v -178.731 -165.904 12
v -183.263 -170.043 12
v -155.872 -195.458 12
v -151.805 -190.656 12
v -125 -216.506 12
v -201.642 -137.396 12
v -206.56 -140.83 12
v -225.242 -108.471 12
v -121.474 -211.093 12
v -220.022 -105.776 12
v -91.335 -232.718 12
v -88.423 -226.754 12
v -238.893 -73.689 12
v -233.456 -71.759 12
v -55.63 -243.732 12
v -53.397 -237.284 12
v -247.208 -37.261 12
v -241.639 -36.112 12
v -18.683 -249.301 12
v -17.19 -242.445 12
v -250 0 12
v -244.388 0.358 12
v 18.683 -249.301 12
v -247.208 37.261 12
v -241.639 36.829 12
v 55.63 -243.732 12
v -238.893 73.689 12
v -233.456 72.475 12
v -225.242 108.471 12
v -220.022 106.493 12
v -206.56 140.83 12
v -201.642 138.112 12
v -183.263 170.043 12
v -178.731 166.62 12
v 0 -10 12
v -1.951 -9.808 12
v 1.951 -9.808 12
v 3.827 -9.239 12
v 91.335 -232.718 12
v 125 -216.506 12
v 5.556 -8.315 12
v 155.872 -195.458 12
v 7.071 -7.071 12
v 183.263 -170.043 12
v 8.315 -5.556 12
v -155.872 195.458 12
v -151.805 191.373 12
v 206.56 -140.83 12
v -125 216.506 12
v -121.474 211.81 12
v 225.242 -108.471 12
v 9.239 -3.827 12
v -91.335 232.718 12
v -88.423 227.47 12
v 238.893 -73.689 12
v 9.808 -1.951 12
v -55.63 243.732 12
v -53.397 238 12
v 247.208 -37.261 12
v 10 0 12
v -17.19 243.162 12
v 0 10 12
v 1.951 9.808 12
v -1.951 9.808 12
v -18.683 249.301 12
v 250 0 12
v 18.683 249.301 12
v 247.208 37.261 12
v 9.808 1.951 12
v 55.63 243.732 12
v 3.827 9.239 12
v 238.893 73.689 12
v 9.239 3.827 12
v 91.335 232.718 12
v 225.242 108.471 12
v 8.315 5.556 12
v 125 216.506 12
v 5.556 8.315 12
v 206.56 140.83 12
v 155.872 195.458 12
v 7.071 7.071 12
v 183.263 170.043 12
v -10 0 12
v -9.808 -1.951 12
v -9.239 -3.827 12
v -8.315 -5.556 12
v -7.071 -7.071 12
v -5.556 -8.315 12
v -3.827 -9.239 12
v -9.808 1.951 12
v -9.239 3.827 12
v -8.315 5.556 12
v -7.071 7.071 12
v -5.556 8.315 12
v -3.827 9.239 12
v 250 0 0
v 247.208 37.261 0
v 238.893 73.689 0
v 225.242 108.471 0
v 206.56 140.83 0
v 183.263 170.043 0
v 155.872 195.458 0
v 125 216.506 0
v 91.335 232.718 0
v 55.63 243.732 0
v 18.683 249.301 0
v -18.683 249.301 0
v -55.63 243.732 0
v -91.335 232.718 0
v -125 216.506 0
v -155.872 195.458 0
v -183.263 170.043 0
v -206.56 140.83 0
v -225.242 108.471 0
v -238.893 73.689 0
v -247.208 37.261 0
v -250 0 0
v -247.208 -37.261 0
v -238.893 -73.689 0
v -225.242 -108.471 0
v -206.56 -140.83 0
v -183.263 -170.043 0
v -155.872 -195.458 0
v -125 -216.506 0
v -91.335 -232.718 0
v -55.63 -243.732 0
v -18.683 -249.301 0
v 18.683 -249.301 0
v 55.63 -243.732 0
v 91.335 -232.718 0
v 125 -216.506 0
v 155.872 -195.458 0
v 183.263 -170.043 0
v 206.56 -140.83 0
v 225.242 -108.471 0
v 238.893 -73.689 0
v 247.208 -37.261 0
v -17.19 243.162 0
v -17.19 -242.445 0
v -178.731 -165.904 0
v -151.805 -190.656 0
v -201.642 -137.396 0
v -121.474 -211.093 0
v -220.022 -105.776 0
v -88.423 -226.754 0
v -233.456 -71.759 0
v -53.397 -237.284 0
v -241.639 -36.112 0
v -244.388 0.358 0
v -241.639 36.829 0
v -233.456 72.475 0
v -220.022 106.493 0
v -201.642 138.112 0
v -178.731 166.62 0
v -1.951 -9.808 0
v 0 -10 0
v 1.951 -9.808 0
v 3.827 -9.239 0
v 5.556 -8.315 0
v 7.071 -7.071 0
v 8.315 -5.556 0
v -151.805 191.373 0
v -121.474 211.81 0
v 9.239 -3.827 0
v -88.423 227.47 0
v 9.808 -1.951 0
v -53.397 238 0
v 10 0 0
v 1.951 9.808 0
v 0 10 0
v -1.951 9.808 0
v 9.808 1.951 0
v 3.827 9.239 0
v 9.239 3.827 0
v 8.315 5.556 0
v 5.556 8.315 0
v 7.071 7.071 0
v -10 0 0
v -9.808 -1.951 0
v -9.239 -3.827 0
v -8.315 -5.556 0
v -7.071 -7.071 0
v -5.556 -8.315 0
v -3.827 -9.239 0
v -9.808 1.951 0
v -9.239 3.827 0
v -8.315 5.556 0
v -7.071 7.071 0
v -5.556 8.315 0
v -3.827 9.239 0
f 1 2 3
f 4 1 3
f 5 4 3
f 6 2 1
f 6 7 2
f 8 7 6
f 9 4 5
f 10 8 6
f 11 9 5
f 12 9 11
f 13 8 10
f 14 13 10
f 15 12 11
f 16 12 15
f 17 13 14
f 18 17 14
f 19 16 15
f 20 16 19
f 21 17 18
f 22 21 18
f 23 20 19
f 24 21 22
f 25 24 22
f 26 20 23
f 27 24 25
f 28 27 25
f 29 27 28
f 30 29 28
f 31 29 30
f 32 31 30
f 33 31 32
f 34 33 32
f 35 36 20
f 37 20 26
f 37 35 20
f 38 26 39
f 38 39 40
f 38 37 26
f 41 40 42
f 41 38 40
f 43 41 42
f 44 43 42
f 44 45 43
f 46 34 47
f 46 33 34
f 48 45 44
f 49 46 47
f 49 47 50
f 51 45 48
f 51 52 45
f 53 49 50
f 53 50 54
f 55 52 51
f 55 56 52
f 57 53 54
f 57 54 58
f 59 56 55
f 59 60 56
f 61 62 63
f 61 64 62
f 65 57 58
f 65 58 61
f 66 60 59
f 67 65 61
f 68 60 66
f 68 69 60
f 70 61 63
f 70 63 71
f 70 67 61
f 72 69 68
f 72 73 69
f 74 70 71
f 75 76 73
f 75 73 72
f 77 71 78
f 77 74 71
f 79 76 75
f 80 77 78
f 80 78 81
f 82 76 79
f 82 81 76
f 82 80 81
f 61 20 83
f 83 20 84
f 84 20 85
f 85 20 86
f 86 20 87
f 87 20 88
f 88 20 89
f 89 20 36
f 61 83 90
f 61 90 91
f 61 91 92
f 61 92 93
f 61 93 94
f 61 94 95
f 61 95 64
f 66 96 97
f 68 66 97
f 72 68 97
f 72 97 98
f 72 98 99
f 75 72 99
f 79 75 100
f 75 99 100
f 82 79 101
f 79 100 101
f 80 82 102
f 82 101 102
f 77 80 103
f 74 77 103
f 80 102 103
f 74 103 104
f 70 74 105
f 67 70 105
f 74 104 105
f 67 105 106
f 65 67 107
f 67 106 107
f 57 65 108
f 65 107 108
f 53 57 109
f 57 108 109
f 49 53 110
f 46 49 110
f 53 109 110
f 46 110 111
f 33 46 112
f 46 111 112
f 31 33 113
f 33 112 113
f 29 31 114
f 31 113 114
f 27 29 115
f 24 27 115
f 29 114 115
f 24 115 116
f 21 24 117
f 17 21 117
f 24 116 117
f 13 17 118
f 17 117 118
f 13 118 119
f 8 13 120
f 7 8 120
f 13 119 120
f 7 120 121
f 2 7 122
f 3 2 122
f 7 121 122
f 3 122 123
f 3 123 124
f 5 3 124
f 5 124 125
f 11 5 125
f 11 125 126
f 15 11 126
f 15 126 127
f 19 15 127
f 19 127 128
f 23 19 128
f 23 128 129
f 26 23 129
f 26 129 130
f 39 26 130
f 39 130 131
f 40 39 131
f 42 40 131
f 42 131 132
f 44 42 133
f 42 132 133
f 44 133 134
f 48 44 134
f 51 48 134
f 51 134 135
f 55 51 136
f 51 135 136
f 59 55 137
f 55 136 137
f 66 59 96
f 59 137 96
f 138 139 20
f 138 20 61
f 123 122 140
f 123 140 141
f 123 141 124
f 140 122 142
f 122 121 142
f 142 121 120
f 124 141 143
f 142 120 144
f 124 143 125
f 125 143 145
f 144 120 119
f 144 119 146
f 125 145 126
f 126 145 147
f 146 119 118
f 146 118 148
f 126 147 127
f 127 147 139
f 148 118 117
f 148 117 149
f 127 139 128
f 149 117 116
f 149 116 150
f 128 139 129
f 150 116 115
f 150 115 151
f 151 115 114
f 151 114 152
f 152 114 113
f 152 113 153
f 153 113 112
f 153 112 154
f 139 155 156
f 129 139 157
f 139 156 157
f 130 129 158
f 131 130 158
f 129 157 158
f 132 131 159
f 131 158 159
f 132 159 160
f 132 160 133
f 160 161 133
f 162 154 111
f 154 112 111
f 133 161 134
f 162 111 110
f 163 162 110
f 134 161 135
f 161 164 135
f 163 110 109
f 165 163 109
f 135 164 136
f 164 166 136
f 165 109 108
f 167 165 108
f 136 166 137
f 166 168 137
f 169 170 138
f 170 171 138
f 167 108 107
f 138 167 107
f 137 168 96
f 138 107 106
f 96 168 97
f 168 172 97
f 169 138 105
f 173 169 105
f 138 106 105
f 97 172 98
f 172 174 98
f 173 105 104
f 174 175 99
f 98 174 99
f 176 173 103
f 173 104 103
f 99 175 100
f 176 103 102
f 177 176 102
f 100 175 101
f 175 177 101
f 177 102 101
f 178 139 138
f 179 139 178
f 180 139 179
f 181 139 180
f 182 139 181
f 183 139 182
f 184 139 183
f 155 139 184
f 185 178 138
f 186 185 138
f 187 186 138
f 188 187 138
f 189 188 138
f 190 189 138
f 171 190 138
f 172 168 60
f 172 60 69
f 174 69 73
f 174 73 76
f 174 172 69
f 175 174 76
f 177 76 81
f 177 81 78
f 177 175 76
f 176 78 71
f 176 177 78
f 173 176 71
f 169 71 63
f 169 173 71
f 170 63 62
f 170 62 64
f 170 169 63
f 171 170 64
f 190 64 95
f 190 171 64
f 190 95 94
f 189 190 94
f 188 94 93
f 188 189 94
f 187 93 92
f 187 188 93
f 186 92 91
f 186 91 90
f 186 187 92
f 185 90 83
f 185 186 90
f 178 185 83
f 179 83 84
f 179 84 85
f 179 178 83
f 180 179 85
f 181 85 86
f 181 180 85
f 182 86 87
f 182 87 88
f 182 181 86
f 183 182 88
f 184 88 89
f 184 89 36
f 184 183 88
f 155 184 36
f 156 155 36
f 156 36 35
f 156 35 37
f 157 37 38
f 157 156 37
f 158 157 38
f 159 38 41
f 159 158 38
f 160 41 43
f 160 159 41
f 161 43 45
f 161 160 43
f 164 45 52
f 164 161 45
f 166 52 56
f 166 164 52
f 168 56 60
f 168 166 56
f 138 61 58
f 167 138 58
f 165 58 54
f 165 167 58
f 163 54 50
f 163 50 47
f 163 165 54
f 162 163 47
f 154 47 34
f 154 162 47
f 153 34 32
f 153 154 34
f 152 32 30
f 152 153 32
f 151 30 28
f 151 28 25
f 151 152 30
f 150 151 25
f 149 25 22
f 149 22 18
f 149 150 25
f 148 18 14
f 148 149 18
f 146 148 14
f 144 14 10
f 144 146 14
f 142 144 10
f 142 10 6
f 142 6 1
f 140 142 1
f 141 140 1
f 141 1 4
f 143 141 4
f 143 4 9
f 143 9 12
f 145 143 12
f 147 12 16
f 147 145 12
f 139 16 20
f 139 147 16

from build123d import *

# Parameters (mm, degrees)
F0_R     = 250
F1_DEPTH = 12
F2_R     = 10
F3_DEPTH = 12
F5_DEPTH = 12


with BuildPart() as f1:
    # F0 (on Top) → F1 (new body)
    with BuildSketch(Plane.XY):
        Circle(F0_R)
    extrude(amount=F1_DEPTH)

    # F2 (on Top) → F3 (cut)
    with BuildSketch(Plane.XY):
        Circle(F2_R)
    extrude(amount=F3_DEPTH, mode=Mode.SUBTRACT)

    # F4 (on Top) → F5 (cut)
    with BuildSketch(Plane.XY):
        with BuildLine():
            Line((-17.189631, -242.445424), (-17.189631, 0))
            Line((-17.189631, 0), (-17.189631, 243.161663))
            ThreePointArc((-17.189631, 243.161663), (-244.387855, 0.35812), (-17.189631, -242.445424))
        make_face()
    extrude(amount=F5_DEPTH, mode=Mode.SUBTRACT)


solid = f1.part
